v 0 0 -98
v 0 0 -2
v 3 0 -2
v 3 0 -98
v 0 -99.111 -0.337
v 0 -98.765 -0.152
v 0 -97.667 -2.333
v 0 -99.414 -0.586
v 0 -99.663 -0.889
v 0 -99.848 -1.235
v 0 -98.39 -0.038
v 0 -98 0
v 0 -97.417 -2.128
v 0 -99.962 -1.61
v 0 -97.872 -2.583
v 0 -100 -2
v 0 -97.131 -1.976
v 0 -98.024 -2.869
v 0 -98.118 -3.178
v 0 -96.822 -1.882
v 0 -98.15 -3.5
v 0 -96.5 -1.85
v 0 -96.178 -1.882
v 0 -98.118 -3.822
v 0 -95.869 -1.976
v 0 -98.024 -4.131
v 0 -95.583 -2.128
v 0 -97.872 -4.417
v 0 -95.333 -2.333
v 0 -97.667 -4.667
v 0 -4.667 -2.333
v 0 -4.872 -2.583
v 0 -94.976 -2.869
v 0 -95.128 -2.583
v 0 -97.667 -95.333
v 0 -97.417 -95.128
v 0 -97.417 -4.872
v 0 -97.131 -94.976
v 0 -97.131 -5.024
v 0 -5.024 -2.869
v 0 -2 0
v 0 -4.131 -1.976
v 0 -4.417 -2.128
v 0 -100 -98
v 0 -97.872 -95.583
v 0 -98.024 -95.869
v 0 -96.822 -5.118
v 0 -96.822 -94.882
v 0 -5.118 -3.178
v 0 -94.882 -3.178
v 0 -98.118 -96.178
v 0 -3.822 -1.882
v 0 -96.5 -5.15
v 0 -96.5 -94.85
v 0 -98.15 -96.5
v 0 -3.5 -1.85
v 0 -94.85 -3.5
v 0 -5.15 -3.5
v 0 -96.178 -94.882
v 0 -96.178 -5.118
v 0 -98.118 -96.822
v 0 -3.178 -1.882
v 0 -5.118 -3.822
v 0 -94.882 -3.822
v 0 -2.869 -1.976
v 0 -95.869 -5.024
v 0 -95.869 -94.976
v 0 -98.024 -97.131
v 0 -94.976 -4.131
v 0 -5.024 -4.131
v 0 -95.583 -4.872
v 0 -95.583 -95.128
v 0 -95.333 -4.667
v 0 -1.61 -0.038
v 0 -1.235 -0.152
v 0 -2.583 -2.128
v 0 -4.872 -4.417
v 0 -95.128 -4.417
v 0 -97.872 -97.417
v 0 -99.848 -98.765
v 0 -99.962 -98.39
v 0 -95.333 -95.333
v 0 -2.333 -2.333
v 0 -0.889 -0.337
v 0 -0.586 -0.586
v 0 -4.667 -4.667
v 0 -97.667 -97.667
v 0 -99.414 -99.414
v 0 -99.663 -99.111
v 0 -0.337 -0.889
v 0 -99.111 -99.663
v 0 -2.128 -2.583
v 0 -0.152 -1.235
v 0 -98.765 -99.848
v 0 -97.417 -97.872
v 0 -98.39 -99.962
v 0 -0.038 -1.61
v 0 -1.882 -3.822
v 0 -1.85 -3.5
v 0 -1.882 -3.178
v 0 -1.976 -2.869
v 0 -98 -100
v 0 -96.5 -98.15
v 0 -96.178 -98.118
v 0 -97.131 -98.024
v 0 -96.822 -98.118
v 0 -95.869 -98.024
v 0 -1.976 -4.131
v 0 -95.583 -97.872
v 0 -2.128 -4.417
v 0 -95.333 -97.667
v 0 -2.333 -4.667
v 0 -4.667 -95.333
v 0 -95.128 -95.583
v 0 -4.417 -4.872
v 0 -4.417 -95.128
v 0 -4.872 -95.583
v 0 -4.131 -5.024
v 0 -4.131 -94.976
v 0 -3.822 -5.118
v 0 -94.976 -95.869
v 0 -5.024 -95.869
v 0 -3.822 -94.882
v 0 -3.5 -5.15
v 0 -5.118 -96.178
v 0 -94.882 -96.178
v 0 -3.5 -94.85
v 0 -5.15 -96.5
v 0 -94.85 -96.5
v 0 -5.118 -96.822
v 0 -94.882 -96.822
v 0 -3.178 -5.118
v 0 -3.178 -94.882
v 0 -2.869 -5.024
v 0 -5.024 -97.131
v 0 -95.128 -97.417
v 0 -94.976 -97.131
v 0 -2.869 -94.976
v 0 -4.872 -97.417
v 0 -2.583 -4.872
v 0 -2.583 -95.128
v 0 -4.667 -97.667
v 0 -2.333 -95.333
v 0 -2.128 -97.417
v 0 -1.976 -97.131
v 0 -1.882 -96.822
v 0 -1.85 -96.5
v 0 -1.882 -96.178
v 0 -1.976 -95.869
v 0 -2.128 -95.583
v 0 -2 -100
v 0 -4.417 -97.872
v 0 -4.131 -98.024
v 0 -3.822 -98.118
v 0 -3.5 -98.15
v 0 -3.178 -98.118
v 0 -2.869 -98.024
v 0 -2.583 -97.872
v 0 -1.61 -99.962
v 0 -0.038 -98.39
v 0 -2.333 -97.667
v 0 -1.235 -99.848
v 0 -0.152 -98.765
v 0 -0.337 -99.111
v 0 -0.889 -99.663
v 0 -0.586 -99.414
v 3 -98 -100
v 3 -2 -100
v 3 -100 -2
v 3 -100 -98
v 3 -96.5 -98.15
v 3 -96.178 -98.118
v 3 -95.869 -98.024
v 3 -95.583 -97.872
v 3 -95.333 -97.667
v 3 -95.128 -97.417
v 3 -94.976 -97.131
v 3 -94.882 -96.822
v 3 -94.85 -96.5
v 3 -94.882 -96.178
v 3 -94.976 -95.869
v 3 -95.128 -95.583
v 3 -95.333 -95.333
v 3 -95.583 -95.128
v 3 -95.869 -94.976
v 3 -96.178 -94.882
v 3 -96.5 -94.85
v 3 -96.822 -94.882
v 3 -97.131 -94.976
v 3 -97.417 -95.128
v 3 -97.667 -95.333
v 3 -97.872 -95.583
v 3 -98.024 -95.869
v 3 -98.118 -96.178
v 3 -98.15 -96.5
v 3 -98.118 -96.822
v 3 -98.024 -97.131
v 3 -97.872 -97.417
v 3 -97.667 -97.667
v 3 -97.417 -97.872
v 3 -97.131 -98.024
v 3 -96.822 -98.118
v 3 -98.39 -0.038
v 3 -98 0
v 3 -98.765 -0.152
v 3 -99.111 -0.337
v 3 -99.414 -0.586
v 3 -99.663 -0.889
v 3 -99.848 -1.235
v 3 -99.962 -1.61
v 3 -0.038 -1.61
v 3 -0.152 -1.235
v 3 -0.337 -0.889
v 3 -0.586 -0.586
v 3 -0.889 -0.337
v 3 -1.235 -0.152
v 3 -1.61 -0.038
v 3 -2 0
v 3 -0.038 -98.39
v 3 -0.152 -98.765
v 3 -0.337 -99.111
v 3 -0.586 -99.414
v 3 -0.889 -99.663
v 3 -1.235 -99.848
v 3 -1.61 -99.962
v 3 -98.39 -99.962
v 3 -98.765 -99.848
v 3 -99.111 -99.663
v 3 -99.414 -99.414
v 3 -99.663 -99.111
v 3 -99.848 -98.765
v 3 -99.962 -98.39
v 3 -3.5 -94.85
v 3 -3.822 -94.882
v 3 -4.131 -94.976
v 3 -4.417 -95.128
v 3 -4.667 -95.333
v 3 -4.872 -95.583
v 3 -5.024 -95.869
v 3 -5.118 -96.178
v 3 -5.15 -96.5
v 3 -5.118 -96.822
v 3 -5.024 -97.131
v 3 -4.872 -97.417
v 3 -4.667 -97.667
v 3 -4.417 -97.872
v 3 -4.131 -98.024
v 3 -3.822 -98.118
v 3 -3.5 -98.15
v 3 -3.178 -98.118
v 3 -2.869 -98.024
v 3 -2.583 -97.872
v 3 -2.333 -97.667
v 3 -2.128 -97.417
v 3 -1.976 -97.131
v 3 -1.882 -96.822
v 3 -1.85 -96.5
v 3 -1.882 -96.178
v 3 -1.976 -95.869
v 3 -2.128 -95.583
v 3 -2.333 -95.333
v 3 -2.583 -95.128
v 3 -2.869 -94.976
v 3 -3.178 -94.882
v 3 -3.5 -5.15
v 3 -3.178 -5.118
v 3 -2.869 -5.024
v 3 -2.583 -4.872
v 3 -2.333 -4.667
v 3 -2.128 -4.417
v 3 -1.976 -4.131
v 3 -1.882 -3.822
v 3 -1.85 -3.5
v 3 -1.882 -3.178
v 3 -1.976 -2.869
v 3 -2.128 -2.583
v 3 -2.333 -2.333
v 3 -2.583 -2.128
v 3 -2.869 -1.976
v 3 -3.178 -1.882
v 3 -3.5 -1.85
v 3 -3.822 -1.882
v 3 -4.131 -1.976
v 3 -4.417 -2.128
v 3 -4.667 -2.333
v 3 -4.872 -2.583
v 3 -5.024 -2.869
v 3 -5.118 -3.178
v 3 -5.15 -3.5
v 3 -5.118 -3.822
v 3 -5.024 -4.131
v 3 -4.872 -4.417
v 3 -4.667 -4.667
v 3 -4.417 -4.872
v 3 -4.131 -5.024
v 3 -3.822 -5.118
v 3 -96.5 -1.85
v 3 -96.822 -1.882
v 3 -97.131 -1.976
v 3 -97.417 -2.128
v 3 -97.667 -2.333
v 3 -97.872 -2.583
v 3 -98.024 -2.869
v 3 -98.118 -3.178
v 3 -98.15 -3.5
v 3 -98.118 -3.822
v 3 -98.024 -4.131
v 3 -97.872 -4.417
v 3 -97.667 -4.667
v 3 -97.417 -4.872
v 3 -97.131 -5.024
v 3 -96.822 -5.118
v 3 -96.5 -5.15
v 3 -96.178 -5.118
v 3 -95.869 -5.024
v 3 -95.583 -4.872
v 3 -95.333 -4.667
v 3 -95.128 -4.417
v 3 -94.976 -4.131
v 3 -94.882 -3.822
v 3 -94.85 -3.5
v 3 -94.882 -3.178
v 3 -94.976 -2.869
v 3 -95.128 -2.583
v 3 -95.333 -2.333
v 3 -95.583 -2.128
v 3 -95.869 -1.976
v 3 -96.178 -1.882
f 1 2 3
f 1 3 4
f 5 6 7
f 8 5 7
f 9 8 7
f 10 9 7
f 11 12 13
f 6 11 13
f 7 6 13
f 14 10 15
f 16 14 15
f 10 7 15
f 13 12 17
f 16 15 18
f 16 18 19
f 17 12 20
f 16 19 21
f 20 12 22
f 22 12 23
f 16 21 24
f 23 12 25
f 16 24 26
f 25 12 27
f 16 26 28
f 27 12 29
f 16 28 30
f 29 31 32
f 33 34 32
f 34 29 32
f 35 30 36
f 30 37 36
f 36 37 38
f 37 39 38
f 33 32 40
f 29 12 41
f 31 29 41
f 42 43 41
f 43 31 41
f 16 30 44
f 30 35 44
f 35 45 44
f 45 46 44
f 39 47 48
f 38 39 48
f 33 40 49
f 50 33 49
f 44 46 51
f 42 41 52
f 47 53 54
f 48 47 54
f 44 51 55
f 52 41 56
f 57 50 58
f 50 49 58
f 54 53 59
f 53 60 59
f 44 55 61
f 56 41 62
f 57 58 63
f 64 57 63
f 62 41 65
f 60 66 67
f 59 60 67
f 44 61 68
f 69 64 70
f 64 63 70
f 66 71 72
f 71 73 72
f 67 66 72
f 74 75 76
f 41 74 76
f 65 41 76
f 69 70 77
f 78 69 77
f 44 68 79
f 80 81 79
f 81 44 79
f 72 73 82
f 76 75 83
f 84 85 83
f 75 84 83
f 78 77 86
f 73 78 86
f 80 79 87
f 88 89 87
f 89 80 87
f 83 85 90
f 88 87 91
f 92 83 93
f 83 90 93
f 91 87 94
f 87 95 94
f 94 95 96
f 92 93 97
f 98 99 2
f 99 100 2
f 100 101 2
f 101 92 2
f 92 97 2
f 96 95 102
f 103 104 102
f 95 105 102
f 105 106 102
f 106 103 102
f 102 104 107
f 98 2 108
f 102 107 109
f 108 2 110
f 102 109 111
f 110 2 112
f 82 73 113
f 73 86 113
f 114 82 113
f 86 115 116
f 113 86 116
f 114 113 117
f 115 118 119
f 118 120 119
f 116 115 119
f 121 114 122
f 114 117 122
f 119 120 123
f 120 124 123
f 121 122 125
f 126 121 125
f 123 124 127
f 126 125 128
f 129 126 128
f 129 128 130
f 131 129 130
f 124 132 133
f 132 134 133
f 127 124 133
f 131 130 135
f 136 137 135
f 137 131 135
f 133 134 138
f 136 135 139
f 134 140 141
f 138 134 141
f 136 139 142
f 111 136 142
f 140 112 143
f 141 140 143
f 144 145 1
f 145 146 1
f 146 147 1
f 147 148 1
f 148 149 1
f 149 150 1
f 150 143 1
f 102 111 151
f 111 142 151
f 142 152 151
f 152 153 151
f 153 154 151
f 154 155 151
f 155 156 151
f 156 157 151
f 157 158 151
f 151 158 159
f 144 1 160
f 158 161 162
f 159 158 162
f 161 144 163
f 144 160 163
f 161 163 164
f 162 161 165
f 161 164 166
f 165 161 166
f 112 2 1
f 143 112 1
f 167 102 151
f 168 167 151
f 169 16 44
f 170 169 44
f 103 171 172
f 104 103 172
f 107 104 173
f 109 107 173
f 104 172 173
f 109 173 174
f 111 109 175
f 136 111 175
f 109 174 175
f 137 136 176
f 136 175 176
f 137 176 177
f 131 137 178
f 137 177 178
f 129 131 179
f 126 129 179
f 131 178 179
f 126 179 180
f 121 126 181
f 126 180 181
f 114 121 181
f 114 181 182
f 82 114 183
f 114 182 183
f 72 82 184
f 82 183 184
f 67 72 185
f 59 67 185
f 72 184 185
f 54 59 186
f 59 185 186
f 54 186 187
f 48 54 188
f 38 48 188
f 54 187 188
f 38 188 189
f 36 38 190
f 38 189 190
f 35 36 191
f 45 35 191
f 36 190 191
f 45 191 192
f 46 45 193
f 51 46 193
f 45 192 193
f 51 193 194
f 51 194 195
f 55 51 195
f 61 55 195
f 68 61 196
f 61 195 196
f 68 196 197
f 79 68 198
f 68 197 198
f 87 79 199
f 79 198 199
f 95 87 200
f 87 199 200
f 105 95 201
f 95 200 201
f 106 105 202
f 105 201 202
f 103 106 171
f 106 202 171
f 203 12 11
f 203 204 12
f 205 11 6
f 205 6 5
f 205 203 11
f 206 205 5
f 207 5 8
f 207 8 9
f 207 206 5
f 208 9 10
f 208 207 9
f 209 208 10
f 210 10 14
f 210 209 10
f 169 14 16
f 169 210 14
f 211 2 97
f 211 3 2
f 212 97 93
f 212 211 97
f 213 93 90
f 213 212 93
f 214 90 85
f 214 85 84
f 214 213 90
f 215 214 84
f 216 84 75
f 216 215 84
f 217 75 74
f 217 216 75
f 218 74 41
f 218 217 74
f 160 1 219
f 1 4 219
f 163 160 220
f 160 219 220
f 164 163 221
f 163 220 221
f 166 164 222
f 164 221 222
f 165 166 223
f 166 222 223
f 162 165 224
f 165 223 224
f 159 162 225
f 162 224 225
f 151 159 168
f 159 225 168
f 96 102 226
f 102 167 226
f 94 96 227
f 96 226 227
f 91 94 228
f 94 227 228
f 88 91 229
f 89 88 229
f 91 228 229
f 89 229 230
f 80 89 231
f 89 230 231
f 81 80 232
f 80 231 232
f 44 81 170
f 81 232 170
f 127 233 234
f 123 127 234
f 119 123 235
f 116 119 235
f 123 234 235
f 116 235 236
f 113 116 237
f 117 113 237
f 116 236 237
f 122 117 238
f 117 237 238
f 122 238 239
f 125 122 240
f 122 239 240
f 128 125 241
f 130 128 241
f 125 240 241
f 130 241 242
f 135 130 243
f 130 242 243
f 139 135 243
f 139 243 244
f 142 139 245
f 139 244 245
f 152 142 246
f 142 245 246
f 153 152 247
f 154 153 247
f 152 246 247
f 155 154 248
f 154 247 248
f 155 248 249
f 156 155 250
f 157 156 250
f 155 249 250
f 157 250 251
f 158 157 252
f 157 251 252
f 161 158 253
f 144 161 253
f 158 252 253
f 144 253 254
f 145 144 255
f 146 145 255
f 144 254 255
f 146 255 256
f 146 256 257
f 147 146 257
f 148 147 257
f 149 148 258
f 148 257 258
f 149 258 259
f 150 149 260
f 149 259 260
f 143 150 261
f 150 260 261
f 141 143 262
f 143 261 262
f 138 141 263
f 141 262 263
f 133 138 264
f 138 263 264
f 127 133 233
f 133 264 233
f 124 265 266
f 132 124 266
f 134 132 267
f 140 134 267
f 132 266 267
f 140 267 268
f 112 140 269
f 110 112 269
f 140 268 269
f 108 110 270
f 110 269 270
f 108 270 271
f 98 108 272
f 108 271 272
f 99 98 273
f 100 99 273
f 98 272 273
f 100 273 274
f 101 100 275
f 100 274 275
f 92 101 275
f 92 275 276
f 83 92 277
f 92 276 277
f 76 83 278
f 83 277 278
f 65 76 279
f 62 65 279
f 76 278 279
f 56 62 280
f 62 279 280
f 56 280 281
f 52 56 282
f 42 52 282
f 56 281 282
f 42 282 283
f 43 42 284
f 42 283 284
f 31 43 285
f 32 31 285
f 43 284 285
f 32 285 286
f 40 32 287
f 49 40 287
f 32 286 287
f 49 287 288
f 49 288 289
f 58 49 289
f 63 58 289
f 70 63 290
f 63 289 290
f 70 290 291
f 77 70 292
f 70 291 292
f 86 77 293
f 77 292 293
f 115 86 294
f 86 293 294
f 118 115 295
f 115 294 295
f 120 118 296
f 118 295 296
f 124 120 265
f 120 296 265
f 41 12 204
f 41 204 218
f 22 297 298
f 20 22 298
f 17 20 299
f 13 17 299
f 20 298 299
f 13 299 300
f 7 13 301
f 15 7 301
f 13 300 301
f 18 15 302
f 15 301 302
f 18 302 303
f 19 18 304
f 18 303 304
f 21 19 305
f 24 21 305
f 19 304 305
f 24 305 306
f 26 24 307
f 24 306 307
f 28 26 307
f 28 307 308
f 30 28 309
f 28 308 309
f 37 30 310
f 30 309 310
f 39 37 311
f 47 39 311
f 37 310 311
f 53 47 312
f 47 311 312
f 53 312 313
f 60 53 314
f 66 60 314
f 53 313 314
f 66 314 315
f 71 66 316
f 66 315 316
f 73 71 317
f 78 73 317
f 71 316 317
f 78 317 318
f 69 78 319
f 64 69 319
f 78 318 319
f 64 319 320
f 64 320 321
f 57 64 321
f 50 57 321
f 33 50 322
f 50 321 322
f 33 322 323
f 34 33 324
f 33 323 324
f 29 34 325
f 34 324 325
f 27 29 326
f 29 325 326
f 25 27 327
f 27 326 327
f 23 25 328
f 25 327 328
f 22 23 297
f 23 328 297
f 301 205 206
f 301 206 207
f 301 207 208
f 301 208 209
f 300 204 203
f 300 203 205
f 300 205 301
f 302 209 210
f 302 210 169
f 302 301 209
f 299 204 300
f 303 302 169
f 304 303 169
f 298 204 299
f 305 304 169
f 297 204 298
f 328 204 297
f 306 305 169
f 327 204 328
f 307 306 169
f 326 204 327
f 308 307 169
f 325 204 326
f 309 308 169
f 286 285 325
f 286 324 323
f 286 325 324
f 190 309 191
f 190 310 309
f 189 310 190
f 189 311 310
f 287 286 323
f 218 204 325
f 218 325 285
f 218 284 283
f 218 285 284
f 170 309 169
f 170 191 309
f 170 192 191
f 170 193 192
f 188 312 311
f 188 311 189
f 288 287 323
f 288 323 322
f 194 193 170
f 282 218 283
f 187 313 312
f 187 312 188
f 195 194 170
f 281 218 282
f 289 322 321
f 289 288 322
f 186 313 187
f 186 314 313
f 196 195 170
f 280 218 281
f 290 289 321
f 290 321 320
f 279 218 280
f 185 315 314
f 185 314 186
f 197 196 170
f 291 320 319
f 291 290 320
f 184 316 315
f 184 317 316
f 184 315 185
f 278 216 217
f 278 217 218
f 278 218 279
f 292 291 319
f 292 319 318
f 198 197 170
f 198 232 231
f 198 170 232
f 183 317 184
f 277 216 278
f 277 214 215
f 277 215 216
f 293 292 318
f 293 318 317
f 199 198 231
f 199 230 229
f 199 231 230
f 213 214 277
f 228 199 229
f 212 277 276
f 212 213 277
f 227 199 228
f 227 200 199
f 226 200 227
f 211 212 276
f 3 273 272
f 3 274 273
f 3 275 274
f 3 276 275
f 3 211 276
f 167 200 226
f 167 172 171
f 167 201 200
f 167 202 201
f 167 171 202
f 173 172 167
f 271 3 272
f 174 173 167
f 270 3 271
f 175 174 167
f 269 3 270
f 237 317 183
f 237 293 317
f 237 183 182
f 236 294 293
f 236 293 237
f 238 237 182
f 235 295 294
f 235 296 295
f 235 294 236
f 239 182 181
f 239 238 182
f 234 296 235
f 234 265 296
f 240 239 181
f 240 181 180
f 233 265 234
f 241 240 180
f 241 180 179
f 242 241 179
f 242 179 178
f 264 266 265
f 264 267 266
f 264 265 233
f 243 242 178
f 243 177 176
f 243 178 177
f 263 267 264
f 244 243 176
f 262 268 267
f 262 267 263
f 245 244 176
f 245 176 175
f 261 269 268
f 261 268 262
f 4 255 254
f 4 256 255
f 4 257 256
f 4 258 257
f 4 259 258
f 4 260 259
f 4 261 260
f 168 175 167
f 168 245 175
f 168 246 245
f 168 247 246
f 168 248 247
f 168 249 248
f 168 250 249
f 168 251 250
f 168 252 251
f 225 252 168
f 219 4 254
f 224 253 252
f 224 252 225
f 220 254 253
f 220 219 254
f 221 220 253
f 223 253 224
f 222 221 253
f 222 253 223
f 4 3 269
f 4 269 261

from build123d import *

# Parameters (mm, degrees)
SKETCH_1_W          = 100
SKETCH_1_H          = 100
EXTRUDE_1_DEPTH     = 3
SKETCH_2_R          = 1.65
CUT_EXTRUDE_1_DEPTH = 3
FILLET_1_R          = 2
FILLET_2_R          = 2


with BuildPart() as part:
    # 草图1 → 凸台-拉伸1 (new body)
    with BuildSketch(Plane(origin=(0, 0, 0), x_dir=(0, 0, -1), z_dir=(1, 0, 0))):
        with Locations((50, -50)):
            Rectangle(SKETCH_1_W, SKETCH_1_H)
    extrude(amount=EXTRUDE_1_DEPTH)

    # 草图2 → 切除-拉伸1 (cut)
    with BuildSketch(Plane(origin=(3, 0, 0), x_dir=(0, 0, -1), z_dir=(1, 0, 0))):
        with Locations((3.5, -3.5)):
            Circle(SKETCH_2_R)
        with Locations(Location((96.5, -3.5, 0), (0, 0, 180))):
            Circle(SKETCH_2_R)
        with Locations((96.5, -96.5)):
            Circle(SKETCH_2_R)
        with Locations(Location((3.5, -96.5, 0), (0, 0, 180))):
            Circle(SKETCH_2_R)
    extrude(amount=-CUT_EXTRUDE_1_DEPTH, mode=Mode.SUBTRACT)

    # 圆角1
    fillet_1_edges = [part.edges().sort_by_distance(p)[0] for p in [
        (1.5, 0, -100),
    ]]
    fillet(fillet_1_edges, radius=FILLET_1_R)

    # 圆角2
    fillet_2_edges = [part.edges().sort_by_distance(p)[0] for p in [
        (1.5, 0, 0),
        (1.5, -100, -100),
        (1.5, -100, 0),
    ]]
    fillet(fillet_2_edges, radius=FILLET_2_R)


solid = part.part
